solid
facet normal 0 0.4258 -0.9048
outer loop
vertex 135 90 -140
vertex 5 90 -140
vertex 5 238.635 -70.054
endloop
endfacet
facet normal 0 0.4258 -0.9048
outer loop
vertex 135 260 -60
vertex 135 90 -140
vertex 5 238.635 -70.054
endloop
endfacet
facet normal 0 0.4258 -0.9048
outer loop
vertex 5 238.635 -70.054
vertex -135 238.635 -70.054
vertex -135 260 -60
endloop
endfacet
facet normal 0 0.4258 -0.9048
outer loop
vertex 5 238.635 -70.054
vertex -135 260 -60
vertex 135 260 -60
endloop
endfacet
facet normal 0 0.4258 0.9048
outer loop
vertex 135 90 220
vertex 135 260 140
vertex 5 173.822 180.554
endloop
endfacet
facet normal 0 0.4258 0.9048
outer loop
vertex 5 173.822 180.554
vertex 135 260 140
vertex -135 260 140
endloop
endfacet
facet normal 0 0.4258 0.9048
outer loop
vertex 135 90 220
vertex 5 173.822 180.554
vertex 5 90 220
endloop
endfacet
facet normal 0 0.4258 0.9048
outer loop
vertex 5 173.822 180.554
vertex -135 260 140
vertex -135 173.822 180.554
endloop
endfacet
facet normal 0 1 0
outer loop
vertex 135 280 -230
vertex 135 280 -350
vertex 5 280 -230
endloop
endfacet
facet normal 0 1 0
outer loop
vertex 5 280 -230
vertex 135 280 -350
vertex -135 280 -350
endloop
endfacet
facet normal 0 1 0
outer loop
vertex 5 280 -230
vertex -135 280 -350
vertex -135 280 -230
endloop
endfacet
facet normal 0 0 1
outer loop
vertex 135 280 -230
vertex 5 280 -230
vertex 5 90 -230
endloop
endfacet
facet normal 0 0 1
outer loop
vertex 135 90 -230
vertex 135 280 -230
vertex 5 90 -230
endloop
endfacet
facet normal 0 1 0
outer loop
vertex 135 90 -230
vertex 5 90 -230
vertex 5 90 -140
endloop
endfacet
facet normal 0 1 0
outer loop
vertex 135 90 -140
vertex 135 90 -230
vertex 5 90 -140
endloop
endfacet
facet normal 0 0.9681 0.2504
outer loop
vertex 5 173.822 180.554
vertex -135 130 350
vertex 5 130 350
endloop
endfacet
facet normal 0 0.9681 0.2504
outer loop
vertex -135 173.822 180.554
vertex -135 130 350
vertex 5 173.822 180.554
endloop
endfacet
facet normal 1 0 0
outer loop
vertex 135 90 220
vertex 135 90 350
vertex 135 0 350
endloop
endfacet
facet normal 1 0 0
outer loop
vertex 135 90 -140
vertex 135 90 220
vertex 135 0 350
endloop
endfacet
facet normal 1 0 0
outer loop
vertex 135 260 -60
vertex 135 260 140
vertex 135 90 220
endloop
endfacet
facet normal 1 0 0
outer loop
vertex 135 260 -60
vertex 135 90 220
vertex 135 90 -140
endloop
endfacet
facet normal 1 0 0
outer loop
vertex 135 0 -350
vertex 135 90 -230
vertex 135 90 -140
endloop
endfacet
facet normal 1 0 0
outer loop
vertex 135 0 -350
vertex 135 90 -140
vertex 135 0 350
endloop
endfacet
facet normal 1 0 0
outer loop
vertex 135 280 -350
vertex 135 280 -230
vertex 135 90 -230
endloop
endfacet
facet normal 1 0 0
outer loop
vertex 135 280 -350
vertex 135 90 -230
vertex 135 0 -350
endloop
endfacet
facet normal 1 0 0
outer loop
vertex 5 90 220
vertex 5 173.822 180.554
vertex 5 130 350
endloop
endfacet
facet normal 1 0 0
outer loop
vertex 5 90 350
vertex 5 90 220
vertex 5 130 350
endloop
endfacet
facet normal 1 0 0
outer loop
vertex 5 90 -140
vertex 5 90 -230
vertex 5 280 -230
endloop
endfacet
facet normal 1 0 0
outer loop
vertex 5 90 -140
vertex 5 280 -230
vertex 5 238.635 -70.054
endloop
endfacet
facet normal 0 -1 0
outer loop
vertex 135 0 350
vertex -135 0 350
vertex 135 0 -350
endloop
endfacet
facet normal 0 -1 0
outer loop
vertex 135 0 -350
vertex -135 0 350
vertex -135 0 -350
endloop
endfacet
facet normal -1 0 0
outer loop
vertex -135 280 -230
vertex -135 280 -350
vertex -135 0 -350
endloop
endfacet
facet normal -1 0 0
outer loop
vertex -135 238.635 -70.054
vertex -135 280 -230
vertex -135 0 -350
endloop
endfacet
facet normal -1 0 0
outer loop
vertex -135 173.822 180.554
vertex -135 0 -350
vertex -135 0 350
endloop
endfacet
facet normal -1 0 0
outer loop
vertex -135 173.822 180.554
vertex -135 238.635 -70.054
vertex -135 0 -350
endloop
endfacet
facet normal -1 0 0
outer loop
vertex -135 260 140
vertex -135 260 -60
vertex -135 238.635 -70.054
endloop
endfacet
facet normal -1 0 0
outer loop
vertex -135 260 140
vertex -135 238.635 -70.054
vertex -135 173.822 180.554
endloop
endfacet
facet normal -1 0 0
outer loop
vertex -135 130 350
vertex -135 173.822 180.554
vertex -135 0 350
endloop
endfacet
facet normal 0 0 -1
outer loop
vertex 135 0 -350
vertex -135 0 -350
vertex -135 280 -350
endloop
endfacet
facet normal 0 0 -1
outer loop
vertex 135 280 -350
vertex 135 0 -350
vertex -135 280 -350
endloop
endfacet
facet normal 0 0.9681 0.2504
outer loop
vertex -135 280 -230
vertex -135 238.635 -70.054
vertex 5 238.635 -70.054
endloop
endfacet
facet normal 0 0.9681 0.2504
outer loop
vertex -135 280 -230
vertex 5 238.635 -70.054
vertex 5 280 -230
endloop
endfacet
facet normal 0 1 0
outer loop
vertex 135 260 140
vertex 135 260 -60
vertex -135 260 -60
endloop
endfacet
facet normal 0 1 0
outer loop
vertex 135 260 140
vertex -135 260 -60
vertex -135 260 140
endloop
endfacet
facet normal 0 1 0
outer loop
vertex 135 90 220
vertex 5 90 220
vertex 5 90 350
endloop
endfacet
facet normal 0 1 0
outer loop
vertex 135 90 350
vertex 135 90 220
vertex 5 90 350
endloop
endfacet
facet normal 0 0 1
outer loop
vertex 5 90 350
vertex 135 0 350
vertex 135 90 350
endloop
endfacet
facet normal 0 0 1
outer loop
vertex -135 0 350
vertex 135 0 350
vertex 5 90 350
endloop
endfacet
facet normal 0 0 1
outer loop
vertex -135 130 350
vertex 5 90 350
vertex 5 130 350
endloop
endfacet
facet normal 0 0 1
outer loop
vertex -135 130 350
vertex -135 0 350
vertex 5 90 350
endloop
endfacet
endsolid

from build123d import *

# Parameters (mm, degrees)
BOSS_EXTRUDE1_DEPTH      = 135
BOSS_EXTRUDE1_DEPTH_BACK = 135
BOSS_EXTRUDE2_DEPTH      = 140


with BuildPart() as part:
    # Sketch1 → Boss-Extrude1 (new, two sides: drawn at the far end of the back side and taken through both)
    with BuildSketch(Plane(origin=(0, 0, 0), x_dir=(0, 0, -1), z_dir=(1, 0, 0)).offset(-BOSS_EXTRUDE1_DEPTH_BACK)):
        Polygon((-350, 90), (-350, 0), (350, 0), (350, 280), (230, 280), (230, 90), (140, 90), (60, 260), (-140, 260), (-220, 90), align=None)
    extrude(amount=BOSS_EXTRUDE1_DEPTH + BOSS_EXTRUDE1_DEPTH_BACK)

    # Sketch3 → Boss-Extrude2 (add)
    with BuildSketch(Plane.ZY.offset(135)):
        Polygon((350, 90), (350, 130), (180.554272517, 173.822170901), (220, 90), align=None)
        Polygon((-230, 280), (-230, 90), (-140, 90), (-70.054249548, 238.634719711), align=None)
    extrude(amount=-BOSS_EXTRUDE2_DEPTH)


solid = part.part
